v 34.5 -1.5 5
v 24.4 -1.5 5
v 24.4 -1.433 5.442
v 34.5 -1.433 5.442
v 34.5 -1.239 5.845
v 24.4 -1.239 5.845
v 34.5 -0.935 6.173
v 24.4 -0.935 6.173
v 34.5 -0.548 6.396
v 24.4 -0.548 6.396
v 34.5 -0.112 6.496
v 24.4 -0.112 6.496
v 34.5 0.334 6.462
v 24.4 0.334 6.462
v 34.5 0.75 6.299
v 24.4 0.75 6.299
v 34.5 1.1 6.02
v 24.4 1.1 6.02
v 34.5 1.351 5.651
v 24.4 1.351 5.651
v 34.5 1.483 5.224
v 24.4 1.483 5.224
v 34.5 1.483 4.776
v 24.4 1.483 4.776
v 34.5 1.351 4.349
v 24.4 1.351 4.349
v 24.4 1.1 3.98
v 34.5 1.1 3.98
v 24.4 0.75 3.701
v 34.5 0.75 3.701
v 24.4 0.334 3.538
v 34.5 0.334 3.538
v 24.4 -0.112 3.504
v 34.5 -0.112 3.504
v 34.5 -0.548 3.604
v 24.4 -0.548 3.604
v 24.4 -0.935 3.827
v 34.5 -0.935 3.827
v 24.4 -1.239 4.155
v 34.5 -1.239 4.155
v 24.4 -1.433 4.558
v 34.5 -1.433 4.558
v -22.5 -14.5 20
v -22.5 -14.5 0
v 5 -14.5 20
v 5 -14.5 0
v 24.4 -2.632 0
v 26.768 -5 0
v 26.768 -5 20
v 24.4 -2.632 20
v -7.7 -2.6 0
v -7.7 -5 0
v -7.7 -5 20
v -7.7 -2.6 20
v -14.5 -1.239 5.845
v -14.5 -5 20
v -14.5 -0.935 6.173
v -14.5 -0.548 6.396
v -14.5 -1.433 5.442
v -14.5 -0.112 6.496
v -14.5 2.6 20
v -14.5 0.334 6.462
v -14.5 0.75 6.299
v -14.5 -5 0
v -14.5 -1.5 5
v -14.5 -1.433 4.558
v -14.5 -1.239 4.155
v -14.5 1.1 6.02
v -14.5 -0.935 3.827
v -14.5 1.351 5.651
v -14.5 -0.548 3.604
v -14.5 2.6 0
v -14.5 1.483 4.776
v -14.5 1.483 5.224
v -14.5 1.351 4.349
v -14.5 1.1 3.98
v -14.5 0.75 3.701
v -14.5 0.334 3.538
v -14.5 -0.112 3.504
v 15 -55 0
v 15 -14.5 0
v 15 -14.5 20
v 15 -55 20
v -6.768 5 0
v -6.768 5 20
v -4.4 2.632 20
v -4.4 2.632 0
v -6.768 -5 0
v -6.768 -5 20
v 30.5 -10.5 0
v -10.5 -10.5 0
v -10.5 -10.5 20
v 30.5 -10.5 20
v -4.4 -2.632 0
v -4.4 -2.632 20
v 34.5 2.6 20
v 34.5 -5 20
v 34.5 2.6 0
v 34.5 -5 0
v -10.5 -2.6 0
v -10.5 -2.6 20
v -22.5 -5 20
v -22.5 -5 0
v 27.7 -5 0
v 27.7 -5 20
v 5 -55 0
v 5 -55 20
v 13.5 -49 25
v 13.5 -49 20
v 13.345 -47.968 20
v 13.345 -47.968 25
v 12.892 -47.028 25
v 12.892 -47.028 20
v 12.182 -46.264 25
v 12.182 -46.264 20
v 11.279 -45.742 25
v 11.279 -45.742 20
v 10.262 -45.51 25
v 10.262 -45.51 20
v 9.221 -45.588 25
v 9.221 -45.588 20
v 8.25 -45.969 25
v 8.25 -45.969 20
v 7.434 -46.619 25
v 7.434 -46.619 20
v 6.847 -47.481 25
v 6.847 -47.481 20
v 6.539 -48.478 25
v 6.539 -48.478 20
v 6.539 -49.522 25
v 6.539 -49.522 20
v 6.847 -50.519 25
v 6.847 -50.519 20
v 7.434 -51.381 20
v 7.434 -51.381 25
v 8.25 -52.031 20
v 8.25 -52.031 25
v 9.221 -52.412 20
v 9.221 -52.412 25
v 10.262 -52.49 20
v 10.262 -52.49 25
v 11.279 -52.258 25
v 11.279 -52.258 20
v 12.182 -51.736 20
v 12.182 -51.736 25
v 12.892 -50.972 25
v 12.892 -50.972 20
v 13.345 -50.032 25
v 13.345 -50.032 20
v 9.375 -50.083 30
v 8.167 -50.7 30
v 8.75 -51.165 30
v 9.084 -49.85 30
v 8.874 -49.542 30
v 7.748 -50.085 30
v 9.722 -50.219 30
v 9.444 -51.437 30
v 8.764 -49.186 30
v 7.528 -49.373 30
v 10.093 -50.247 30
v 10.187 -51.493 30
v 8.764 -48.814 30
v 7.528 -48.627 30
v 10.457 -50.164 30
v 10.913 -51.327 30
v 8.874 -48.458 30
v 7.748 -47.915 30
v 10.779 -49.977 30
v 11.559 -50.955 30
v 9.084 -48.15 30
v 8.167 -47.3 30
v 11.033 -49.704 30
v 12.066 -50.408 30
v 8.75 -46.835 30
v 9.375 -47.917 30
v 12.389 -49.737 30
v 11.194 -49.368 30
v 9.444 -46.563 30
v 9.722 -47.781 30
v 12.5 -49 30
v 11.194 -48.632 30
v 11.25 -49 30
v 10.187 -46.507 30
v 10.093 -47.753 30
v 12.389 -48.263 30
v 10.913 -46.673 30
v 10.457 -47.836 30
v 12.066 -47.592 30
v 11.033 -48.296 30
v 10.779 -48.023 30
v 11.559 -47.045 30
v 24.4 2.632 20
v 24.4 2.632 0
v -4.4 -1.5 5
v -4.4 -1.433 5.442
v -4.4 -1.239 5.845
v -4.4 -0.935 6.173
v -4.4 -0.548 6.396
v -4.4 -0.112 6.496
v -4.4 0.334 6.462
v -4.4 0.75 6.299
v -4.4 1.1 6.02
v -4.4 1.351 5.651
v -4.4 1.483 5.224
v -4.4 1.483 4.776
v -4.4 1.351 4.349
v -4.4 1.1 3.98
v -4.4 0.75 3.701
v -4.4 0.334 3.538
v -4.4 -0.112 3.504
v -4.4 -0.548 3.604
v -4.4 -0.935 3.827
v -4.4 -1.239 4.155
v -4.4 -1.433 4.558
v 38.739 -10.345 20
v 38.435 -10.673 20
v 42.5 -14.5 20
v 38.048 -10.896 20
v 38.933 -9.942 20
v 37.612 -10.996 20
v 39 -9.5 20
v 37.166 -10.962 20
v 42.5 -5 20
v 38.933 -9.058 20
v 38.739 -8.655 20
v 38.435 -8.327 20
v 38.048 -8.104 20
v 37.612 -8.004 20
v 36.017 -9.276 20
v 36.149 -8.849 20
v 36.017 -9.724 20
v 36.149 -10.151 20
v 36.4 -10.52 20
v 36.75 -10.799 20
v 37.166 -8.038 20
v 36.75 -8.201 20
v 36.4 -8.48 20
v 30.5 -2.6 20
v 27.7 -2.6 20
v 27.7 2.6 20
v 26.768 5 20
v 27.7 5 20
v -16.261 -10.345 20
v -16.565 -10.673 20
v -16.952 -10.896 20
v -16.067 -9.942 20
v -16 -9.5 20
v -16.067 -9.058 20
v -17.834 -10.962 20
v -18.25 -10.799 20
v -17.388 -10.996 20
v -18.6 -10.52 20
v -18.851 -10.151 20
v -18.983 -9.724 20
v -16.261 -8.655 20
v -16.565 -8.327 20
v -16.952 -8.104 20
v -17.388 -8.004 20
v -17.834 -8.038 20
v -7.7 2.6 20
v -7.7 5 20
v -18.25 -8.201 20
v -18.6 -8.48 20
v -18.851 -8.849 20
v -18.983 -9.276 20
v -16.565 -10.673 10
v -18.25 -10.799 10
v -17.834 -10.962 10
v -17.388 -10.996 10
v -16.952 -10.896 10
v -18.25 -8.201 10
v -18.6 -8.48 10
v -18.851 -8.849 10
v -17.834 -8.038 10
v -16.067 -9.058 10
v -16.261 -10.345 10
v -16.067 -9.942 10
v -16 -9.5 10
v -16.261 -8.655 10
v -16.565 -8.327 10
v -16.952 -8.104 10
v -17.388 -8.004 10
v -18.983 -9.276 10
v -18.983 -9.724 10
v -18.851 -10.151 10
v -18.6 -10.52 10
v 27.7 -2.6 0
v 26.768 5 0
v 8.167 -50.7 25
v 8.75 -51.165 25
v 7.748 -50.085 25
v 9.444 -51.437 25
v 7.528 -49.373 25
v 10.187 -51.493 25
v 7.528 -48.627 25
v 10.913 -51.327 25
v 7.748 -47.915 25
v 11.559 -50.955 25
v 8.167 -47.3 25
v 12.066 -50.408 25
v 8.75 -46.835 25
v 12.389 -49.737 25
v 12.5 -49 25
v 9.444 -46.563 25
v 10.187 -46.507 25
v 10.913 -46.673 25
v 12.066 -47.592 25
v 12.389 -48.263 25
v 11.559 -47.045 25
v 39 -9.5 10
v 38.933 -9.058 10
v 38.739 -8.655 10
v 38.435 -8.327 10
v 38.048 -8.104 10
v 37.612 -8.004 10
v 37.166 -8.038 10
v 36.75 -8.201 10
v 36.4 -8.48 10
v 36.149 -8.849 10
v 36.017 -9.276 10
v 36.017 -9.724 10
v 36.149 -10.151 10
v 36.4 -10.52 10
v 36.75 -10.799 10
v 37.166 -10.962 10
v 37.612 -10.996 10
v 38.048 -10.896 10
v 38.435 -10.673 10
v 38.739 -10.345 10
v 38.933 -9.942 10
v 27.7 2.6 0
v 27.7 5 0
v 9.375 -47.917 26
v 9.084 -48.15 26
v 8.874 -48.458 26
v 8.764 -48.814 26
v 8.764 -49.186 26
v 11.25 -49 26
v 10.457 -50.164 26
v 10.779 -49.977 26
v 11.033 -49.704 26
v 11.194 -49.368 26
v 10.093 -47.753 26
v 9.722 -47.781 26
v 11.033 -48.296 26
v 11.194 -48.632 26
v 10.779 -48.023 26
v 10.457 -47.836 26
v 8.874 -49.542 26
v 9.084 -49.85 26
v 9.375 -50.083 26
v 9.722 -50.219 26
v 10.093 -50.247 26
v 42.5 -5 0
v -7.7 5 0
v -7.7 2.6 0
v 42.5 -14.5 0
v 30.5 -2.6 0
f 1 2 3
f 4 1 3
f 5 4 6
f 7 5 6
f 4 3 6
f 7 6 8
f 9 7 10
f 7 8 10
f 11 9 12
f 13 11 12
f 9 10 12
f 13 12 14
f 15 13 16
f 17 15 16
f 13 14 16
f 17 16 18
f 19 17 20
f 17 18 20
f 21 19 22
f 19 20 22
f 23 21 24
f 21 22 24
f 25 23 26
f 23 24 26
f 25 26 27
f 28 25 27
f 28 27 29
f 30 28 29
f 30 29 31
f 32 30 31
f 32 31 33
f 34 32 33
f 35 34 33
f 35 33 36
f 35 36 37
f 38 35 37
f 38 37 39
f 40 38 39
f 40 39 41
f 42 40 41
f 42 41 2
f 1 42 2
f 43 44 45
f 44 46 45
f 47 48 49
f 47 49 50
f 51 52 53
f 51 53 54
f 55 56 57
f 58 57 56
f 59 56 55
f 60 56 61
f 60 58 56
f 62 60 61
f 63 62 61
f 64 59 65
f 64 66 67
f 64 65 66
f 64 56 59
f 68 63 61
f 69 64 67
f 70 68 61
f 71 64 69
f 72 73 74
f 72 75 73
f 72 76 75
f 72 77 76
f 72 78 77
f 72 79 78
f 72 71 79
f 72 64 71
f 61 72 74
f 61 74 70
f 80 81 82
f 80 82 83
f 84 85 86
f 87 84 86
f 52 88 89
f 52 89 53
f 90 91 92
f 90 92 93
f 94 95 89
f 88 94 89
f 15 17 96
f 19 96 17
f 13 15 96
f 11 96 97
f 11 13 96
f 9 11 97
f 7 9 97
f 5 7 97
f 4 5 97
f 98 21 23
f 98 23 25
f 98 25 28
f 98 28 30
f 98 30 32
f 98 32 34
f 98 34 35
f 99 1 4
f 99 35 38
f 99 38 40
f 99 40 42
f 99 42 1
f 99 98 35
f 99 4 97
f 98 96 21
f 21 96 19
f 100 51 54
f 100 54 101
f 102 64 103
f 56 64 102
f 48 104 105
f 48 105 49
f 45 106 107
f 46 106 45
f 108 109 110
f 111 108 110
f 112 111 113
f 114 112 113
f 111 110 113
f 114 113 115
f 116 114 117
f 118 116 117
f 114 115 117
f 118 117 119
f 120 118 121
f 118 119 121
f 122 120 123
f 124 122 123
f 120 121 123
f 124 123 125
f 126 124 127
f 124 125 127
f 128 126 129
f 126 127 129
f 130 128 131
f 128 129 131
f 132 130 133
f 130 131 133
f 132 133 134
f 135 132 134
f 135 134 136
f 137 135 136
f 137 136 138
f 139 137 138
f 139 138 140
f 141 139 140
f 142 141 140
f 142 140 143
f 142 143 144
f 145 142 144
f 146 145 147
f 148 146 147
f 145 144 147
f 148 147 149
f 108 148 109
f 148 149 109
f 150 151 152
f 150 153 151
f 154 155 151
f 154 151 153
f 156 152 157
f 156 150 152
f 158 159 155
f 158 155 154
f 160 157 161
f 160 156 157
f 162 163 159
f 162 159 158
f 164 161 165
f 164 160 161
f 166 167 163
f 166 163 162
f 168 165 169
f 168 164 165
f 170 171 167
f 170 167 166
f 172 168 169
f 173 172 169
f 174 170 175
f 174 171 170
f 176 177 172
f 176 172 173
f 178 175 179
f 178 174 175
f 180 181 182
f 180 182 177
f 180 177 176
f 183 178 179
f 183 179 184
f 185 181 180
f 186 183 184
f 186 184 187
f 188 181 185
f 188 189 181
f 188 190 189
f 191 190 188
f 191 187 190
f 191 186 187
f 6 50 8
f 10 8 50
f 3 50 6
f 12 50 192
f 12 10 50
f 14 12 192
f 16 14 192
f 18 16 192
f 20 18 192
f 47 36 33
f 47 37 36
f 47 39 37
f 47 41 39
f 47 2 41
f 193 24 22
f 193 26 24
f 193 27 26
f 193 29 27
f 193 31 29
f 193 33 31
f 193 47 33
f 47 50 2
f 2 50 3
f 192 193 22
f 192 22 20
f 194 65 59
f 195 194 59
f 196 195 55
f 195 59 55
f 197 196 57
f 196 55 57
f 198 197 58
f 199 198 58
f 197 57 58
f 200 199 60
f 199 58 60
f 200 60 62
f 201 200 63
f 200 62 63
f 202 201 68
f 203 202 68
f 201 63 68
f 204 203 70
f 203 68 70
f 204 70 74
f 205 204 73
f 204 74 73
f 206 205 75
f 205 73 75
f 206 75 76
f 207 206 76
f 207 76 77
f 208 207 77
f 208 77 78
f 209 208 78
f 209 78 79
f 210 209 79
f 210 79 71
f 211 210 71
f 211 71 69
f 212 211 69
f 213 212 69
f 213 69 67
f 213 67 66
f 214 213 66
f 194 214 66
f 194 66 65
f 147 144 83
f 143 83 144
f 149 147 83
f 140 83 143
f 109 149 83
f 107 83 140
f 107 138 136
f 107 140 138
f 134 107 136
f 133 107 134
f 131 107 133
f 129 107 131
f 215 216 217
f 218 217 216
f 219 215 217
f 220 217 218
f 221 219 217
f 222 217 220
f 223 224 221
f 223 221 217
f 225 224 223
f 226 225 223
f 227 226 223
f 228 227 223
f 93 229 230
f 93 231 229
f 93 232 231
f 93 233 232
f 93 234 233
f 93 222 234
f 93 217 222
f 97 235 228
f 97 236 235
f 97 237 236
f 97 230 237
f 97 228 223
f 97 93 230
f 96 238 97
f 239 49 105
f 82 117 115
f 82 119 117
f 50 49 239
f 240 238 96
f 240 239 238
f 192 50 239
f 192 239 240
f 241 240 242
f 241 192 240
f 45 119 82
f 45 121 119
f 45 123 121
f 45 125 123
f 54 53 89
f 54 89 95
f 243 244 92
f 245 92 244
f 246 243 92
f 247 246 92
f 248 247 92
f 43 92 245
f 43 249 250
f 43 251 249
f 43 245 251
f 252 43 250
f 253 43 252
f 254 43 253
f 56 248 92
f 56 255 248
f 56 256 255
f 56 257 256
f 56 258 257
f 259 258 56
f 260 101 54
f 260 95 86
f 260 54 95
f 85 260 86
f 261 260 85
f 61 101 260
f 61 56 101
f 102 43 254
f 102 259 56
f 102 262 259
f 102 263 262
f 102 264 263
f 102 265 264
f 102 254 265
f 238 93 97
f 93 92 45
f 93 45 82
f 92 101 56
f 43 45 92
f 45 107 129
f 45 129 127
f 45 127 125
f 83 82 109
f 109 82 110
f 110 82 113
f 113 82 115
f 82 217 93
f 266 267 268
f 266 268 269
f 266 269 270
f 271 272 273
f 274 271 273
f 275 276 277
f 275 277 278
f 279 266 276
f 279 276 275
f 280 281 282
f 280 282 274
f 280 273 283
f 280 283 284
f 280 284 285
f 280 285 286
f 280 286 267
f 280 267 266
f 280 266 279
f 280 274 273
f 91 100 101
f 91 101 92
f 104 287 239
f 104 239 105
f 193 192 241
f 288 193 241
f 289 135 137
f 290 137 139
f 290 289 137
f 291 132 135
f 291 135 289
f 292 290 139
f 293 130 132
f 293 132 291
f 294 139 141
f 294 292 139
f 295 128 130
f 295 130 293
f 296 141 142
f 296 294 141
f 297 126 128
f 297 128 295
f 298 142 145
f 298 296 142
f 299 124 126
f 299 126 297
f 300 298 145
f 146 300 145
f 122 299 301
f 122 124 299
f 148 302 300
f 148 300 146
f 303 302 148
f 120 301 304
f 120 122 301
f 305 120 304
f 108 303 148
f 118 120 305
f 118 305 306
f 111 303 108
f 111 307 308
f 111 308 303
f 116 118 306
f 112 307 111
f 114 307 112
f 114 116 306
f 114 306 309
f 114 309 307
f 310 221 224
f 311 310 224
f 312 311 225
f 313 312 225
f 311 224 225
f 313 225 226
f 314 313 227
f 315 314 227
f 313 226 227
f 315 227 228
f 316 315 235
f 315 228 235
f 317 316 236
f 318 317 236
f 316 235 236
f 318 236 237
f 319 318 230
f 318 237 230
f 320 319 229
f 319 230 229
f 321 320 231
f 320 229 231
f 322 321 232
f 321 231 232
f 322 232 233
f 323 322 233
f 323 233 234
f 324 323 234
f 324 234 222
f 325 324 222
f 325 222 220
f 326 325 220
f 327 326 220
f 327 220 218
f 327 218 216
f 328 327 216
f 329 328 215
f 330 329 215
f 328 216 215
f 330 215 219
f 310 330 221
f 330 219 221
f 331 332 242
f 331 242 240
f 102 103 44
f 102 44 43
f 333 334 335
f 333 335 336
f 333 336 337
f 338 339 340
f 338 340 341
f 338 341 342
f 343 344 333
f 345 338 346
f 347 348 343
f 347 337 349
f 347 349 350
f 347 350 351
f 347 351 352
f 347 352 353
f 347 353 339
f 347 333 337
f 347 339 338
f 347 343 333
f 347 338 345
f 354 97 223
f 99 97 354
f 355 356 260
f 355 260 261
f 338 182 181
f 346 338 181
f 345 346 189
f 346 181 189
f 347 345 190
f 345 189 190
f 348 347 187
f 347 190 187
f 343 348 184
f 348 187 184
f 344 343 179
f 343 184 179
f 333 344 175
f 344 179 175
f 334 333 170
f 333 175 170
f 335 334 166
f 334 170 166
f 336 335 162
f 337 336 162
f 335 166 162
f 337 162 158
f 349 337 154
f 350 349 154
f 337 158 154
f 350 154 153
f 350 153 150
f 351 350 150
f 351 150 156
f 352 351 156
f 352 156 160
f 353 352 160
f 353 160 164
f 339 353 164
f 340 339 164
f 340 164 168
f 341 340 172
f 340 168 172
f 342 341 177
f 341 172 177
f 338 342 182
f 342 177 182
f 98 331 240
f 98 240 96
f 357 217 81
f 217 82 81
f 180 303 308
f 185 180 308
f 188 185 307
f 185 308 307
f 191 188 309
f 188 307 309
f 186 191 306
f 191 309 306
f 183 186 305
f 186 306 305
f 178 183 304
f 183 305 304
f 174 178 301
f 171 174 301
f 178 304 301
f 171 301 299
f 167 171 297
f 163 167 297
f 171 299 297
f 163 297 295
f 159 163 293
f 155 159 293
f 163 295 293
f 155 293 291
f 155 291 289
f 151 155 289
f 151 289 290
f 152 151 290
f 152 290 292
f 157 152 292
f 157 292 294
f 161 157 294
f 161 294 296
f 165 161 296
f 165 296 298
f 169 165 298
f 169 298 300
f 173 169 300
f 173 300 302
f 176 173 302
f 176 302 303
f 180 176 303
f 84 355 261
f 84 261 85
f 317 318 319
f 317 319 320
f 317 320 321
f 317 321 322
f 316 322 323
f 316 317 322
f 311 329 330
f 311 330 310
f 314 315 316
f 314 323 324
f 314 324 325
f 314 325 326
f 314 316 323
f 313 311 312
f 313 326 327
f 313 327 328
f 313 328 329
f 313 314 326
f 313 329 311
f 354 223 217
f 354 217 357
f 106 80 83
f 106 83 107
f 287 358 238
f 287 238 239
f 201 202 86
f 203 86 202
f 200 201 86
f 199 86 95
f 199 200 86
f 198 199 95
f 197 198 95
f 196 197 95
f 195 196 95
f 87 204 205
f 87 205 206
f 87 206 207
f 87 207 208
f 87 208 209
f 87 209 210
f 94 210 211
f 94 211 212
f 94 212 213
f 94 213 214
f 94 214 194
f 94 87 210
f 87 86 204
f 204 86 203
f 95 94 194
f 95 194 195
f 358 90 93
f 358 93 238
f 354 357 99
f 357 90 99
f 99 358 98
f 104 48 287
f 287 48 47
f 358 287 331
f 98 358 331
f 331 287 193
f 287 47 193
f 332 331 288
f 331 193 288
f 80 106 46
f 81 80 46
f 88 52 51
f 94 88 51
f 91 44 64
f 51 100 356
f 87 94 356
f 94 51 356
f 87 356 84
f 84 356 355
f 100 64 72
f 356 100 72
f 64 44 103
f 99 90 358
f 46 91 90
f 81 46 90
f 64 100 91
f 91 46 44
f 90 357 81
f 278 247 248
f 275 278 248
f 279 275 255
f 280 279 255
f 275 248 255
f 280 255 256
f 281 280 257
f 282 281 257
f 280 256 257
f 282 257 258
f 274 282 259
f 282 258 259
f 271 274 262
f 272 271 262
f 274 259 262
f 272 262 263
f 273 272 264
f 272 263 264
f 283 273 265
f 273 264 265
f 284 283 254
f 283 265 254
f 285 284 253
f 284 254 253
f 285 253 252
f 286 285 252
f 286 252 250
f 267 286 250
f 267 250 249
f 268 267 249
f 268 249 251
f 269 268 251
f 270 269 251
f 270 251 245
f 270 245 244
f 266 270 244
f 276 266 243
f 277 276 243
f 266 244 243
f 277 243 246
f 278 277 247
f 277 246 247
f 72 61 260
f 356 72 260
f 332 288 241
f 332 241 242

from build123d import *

# Parameters (mm, degrees)
BOSS_EXTRUDE1_DEPTH = 20
SKETCH2_R           = 1.5
CUT_EXTRUDE1_DEPTH  = 60
SKETCH4_R           = 2.5
BOSS_EXTRUDE2_DEPTH = 10
SKETCH5_R           = 3.5
BOSS_EXTRUDE3_DEPTH = 5
SKETCH6_R           = 1.25
CUT_EXTRUDE3_DEPTH  = 4
SKETCH7_W           = 20
SKETCH7_H           = 9.5
BOSS_EXTRUDE4_DEPTH = 8
SKETCH8_W           = 20
SKETCH8_H           = 9.5
BOSS_EXTRUDE5_DEPTH = 8
SKETCH9_R           = 1.5
CUT_EXTRUDE4_DEPTH  = 10


with BuildPart() as part:
    # Sketch1 → Boss-Extrude1 (new body)
    with BuildSketch(Plane.XY):
        Polygon((-14.5, 2.6), (-7.7, 2.6), (-7.7, 5), (-6.767766953, 5), (-4.4, 2.632233047), (-4.4, -2.632233047), (-6.767766953, -5), (-7.7, -5), (-7.7, -2.6), (-10.5, -2.6), (-10.5, -10.5), (30.5, -10.5), (30.5, -2.6), (27.7, -2.6), (27.7, -5), (26.767766953, -5), (24.4, -2.632233047), (24.4, 2.632233047), (26.767766953, 5), (27.7, 5), (27.7, 2.6), (34.5, 2.6), (34.5, -14.5), (15, -14.5), (15, -55), (5, -55), (5, -14.5), (-14.5, -14.5), align=None)
    extrude(amount=BOSS_EXTRUDE1_DEPTH)

    # Sketch2 → Cut-Extrude1 (cut)
    with BuildSketch(Plane.ZY.offset(14.5)):
        with Locations(Location((5, 0, 0), (0, 0, 270))):
            Circle(SKETCH2_R)
    extrude(amount=-CUT_EXTRUDE1_DEPTH, mode=Mode.SUBTRACT)

    # Sketch4 → Boss-Extrude2 (add)
    with BuildSketch(Plane.XY.offset(20)):
        with Locations((10, -49)):
            Circle(SKETCH4_R)
    extrude(amount=BOSS_EXTRUDE2_DEPTH)

    # Sketch5 → Boss-Extrude3 (add)
    with BuildSketch(Plane.XY.offset(20)):
        with Locations((10, -49)):
            Circle(SKETCH5_R)
    extrude(amount=BOSS_EXTRUDE3_DEPTH)

    # Sketch6 → Cut-Extrude3 (cut)
    with BuildSketch(Plane.XY.offset(30)):
        with Locations((10, -49)):
            Circle(SKETCH6_R)
    extrude(amount=-CUT_EXTRUDE3_DEPTH, mode=Mode.SUBTRACT)

    # Sketch7 → Boss-Extrude4 (add)
    with BuildSketch(Plane.ZY.offset(14.5)):
        with Locations((10, -9.75)):
            Rectangle(SKETCH7_W, SKETCH7_H)
    extrude(amount=BOSS_EXTRUDE4_DEPTH)

    # Sketch8 → Boss-Extrude5 (add)
    with BuildSketch(Plane(origin=(34.5, 0, 0), x_dir=(0, 0, -1), z_dir=(1, 0, 0))):
        with Locations((-10, -9.75)):
            Rectangle(SKETCH8_W, SKETCH8_H)
    extrude(amount=BOSS_EXTRUDE5_DEPTH)

    # Sketch9 → Cut-Extrude4 (cut)
    with BuildSketch(Plane.XY.offset(20)):
        with Locations((-17.5, -9.5)):
            Circle(SKETCH9_R)
        with Locations((37.5, -9.5)):
            Circle(SKETCH9_R)
    extrude(amount=-CUT_EXTRUDE4_DEPTH, mode=Mode.SUBTRACT)


solid = part.part
